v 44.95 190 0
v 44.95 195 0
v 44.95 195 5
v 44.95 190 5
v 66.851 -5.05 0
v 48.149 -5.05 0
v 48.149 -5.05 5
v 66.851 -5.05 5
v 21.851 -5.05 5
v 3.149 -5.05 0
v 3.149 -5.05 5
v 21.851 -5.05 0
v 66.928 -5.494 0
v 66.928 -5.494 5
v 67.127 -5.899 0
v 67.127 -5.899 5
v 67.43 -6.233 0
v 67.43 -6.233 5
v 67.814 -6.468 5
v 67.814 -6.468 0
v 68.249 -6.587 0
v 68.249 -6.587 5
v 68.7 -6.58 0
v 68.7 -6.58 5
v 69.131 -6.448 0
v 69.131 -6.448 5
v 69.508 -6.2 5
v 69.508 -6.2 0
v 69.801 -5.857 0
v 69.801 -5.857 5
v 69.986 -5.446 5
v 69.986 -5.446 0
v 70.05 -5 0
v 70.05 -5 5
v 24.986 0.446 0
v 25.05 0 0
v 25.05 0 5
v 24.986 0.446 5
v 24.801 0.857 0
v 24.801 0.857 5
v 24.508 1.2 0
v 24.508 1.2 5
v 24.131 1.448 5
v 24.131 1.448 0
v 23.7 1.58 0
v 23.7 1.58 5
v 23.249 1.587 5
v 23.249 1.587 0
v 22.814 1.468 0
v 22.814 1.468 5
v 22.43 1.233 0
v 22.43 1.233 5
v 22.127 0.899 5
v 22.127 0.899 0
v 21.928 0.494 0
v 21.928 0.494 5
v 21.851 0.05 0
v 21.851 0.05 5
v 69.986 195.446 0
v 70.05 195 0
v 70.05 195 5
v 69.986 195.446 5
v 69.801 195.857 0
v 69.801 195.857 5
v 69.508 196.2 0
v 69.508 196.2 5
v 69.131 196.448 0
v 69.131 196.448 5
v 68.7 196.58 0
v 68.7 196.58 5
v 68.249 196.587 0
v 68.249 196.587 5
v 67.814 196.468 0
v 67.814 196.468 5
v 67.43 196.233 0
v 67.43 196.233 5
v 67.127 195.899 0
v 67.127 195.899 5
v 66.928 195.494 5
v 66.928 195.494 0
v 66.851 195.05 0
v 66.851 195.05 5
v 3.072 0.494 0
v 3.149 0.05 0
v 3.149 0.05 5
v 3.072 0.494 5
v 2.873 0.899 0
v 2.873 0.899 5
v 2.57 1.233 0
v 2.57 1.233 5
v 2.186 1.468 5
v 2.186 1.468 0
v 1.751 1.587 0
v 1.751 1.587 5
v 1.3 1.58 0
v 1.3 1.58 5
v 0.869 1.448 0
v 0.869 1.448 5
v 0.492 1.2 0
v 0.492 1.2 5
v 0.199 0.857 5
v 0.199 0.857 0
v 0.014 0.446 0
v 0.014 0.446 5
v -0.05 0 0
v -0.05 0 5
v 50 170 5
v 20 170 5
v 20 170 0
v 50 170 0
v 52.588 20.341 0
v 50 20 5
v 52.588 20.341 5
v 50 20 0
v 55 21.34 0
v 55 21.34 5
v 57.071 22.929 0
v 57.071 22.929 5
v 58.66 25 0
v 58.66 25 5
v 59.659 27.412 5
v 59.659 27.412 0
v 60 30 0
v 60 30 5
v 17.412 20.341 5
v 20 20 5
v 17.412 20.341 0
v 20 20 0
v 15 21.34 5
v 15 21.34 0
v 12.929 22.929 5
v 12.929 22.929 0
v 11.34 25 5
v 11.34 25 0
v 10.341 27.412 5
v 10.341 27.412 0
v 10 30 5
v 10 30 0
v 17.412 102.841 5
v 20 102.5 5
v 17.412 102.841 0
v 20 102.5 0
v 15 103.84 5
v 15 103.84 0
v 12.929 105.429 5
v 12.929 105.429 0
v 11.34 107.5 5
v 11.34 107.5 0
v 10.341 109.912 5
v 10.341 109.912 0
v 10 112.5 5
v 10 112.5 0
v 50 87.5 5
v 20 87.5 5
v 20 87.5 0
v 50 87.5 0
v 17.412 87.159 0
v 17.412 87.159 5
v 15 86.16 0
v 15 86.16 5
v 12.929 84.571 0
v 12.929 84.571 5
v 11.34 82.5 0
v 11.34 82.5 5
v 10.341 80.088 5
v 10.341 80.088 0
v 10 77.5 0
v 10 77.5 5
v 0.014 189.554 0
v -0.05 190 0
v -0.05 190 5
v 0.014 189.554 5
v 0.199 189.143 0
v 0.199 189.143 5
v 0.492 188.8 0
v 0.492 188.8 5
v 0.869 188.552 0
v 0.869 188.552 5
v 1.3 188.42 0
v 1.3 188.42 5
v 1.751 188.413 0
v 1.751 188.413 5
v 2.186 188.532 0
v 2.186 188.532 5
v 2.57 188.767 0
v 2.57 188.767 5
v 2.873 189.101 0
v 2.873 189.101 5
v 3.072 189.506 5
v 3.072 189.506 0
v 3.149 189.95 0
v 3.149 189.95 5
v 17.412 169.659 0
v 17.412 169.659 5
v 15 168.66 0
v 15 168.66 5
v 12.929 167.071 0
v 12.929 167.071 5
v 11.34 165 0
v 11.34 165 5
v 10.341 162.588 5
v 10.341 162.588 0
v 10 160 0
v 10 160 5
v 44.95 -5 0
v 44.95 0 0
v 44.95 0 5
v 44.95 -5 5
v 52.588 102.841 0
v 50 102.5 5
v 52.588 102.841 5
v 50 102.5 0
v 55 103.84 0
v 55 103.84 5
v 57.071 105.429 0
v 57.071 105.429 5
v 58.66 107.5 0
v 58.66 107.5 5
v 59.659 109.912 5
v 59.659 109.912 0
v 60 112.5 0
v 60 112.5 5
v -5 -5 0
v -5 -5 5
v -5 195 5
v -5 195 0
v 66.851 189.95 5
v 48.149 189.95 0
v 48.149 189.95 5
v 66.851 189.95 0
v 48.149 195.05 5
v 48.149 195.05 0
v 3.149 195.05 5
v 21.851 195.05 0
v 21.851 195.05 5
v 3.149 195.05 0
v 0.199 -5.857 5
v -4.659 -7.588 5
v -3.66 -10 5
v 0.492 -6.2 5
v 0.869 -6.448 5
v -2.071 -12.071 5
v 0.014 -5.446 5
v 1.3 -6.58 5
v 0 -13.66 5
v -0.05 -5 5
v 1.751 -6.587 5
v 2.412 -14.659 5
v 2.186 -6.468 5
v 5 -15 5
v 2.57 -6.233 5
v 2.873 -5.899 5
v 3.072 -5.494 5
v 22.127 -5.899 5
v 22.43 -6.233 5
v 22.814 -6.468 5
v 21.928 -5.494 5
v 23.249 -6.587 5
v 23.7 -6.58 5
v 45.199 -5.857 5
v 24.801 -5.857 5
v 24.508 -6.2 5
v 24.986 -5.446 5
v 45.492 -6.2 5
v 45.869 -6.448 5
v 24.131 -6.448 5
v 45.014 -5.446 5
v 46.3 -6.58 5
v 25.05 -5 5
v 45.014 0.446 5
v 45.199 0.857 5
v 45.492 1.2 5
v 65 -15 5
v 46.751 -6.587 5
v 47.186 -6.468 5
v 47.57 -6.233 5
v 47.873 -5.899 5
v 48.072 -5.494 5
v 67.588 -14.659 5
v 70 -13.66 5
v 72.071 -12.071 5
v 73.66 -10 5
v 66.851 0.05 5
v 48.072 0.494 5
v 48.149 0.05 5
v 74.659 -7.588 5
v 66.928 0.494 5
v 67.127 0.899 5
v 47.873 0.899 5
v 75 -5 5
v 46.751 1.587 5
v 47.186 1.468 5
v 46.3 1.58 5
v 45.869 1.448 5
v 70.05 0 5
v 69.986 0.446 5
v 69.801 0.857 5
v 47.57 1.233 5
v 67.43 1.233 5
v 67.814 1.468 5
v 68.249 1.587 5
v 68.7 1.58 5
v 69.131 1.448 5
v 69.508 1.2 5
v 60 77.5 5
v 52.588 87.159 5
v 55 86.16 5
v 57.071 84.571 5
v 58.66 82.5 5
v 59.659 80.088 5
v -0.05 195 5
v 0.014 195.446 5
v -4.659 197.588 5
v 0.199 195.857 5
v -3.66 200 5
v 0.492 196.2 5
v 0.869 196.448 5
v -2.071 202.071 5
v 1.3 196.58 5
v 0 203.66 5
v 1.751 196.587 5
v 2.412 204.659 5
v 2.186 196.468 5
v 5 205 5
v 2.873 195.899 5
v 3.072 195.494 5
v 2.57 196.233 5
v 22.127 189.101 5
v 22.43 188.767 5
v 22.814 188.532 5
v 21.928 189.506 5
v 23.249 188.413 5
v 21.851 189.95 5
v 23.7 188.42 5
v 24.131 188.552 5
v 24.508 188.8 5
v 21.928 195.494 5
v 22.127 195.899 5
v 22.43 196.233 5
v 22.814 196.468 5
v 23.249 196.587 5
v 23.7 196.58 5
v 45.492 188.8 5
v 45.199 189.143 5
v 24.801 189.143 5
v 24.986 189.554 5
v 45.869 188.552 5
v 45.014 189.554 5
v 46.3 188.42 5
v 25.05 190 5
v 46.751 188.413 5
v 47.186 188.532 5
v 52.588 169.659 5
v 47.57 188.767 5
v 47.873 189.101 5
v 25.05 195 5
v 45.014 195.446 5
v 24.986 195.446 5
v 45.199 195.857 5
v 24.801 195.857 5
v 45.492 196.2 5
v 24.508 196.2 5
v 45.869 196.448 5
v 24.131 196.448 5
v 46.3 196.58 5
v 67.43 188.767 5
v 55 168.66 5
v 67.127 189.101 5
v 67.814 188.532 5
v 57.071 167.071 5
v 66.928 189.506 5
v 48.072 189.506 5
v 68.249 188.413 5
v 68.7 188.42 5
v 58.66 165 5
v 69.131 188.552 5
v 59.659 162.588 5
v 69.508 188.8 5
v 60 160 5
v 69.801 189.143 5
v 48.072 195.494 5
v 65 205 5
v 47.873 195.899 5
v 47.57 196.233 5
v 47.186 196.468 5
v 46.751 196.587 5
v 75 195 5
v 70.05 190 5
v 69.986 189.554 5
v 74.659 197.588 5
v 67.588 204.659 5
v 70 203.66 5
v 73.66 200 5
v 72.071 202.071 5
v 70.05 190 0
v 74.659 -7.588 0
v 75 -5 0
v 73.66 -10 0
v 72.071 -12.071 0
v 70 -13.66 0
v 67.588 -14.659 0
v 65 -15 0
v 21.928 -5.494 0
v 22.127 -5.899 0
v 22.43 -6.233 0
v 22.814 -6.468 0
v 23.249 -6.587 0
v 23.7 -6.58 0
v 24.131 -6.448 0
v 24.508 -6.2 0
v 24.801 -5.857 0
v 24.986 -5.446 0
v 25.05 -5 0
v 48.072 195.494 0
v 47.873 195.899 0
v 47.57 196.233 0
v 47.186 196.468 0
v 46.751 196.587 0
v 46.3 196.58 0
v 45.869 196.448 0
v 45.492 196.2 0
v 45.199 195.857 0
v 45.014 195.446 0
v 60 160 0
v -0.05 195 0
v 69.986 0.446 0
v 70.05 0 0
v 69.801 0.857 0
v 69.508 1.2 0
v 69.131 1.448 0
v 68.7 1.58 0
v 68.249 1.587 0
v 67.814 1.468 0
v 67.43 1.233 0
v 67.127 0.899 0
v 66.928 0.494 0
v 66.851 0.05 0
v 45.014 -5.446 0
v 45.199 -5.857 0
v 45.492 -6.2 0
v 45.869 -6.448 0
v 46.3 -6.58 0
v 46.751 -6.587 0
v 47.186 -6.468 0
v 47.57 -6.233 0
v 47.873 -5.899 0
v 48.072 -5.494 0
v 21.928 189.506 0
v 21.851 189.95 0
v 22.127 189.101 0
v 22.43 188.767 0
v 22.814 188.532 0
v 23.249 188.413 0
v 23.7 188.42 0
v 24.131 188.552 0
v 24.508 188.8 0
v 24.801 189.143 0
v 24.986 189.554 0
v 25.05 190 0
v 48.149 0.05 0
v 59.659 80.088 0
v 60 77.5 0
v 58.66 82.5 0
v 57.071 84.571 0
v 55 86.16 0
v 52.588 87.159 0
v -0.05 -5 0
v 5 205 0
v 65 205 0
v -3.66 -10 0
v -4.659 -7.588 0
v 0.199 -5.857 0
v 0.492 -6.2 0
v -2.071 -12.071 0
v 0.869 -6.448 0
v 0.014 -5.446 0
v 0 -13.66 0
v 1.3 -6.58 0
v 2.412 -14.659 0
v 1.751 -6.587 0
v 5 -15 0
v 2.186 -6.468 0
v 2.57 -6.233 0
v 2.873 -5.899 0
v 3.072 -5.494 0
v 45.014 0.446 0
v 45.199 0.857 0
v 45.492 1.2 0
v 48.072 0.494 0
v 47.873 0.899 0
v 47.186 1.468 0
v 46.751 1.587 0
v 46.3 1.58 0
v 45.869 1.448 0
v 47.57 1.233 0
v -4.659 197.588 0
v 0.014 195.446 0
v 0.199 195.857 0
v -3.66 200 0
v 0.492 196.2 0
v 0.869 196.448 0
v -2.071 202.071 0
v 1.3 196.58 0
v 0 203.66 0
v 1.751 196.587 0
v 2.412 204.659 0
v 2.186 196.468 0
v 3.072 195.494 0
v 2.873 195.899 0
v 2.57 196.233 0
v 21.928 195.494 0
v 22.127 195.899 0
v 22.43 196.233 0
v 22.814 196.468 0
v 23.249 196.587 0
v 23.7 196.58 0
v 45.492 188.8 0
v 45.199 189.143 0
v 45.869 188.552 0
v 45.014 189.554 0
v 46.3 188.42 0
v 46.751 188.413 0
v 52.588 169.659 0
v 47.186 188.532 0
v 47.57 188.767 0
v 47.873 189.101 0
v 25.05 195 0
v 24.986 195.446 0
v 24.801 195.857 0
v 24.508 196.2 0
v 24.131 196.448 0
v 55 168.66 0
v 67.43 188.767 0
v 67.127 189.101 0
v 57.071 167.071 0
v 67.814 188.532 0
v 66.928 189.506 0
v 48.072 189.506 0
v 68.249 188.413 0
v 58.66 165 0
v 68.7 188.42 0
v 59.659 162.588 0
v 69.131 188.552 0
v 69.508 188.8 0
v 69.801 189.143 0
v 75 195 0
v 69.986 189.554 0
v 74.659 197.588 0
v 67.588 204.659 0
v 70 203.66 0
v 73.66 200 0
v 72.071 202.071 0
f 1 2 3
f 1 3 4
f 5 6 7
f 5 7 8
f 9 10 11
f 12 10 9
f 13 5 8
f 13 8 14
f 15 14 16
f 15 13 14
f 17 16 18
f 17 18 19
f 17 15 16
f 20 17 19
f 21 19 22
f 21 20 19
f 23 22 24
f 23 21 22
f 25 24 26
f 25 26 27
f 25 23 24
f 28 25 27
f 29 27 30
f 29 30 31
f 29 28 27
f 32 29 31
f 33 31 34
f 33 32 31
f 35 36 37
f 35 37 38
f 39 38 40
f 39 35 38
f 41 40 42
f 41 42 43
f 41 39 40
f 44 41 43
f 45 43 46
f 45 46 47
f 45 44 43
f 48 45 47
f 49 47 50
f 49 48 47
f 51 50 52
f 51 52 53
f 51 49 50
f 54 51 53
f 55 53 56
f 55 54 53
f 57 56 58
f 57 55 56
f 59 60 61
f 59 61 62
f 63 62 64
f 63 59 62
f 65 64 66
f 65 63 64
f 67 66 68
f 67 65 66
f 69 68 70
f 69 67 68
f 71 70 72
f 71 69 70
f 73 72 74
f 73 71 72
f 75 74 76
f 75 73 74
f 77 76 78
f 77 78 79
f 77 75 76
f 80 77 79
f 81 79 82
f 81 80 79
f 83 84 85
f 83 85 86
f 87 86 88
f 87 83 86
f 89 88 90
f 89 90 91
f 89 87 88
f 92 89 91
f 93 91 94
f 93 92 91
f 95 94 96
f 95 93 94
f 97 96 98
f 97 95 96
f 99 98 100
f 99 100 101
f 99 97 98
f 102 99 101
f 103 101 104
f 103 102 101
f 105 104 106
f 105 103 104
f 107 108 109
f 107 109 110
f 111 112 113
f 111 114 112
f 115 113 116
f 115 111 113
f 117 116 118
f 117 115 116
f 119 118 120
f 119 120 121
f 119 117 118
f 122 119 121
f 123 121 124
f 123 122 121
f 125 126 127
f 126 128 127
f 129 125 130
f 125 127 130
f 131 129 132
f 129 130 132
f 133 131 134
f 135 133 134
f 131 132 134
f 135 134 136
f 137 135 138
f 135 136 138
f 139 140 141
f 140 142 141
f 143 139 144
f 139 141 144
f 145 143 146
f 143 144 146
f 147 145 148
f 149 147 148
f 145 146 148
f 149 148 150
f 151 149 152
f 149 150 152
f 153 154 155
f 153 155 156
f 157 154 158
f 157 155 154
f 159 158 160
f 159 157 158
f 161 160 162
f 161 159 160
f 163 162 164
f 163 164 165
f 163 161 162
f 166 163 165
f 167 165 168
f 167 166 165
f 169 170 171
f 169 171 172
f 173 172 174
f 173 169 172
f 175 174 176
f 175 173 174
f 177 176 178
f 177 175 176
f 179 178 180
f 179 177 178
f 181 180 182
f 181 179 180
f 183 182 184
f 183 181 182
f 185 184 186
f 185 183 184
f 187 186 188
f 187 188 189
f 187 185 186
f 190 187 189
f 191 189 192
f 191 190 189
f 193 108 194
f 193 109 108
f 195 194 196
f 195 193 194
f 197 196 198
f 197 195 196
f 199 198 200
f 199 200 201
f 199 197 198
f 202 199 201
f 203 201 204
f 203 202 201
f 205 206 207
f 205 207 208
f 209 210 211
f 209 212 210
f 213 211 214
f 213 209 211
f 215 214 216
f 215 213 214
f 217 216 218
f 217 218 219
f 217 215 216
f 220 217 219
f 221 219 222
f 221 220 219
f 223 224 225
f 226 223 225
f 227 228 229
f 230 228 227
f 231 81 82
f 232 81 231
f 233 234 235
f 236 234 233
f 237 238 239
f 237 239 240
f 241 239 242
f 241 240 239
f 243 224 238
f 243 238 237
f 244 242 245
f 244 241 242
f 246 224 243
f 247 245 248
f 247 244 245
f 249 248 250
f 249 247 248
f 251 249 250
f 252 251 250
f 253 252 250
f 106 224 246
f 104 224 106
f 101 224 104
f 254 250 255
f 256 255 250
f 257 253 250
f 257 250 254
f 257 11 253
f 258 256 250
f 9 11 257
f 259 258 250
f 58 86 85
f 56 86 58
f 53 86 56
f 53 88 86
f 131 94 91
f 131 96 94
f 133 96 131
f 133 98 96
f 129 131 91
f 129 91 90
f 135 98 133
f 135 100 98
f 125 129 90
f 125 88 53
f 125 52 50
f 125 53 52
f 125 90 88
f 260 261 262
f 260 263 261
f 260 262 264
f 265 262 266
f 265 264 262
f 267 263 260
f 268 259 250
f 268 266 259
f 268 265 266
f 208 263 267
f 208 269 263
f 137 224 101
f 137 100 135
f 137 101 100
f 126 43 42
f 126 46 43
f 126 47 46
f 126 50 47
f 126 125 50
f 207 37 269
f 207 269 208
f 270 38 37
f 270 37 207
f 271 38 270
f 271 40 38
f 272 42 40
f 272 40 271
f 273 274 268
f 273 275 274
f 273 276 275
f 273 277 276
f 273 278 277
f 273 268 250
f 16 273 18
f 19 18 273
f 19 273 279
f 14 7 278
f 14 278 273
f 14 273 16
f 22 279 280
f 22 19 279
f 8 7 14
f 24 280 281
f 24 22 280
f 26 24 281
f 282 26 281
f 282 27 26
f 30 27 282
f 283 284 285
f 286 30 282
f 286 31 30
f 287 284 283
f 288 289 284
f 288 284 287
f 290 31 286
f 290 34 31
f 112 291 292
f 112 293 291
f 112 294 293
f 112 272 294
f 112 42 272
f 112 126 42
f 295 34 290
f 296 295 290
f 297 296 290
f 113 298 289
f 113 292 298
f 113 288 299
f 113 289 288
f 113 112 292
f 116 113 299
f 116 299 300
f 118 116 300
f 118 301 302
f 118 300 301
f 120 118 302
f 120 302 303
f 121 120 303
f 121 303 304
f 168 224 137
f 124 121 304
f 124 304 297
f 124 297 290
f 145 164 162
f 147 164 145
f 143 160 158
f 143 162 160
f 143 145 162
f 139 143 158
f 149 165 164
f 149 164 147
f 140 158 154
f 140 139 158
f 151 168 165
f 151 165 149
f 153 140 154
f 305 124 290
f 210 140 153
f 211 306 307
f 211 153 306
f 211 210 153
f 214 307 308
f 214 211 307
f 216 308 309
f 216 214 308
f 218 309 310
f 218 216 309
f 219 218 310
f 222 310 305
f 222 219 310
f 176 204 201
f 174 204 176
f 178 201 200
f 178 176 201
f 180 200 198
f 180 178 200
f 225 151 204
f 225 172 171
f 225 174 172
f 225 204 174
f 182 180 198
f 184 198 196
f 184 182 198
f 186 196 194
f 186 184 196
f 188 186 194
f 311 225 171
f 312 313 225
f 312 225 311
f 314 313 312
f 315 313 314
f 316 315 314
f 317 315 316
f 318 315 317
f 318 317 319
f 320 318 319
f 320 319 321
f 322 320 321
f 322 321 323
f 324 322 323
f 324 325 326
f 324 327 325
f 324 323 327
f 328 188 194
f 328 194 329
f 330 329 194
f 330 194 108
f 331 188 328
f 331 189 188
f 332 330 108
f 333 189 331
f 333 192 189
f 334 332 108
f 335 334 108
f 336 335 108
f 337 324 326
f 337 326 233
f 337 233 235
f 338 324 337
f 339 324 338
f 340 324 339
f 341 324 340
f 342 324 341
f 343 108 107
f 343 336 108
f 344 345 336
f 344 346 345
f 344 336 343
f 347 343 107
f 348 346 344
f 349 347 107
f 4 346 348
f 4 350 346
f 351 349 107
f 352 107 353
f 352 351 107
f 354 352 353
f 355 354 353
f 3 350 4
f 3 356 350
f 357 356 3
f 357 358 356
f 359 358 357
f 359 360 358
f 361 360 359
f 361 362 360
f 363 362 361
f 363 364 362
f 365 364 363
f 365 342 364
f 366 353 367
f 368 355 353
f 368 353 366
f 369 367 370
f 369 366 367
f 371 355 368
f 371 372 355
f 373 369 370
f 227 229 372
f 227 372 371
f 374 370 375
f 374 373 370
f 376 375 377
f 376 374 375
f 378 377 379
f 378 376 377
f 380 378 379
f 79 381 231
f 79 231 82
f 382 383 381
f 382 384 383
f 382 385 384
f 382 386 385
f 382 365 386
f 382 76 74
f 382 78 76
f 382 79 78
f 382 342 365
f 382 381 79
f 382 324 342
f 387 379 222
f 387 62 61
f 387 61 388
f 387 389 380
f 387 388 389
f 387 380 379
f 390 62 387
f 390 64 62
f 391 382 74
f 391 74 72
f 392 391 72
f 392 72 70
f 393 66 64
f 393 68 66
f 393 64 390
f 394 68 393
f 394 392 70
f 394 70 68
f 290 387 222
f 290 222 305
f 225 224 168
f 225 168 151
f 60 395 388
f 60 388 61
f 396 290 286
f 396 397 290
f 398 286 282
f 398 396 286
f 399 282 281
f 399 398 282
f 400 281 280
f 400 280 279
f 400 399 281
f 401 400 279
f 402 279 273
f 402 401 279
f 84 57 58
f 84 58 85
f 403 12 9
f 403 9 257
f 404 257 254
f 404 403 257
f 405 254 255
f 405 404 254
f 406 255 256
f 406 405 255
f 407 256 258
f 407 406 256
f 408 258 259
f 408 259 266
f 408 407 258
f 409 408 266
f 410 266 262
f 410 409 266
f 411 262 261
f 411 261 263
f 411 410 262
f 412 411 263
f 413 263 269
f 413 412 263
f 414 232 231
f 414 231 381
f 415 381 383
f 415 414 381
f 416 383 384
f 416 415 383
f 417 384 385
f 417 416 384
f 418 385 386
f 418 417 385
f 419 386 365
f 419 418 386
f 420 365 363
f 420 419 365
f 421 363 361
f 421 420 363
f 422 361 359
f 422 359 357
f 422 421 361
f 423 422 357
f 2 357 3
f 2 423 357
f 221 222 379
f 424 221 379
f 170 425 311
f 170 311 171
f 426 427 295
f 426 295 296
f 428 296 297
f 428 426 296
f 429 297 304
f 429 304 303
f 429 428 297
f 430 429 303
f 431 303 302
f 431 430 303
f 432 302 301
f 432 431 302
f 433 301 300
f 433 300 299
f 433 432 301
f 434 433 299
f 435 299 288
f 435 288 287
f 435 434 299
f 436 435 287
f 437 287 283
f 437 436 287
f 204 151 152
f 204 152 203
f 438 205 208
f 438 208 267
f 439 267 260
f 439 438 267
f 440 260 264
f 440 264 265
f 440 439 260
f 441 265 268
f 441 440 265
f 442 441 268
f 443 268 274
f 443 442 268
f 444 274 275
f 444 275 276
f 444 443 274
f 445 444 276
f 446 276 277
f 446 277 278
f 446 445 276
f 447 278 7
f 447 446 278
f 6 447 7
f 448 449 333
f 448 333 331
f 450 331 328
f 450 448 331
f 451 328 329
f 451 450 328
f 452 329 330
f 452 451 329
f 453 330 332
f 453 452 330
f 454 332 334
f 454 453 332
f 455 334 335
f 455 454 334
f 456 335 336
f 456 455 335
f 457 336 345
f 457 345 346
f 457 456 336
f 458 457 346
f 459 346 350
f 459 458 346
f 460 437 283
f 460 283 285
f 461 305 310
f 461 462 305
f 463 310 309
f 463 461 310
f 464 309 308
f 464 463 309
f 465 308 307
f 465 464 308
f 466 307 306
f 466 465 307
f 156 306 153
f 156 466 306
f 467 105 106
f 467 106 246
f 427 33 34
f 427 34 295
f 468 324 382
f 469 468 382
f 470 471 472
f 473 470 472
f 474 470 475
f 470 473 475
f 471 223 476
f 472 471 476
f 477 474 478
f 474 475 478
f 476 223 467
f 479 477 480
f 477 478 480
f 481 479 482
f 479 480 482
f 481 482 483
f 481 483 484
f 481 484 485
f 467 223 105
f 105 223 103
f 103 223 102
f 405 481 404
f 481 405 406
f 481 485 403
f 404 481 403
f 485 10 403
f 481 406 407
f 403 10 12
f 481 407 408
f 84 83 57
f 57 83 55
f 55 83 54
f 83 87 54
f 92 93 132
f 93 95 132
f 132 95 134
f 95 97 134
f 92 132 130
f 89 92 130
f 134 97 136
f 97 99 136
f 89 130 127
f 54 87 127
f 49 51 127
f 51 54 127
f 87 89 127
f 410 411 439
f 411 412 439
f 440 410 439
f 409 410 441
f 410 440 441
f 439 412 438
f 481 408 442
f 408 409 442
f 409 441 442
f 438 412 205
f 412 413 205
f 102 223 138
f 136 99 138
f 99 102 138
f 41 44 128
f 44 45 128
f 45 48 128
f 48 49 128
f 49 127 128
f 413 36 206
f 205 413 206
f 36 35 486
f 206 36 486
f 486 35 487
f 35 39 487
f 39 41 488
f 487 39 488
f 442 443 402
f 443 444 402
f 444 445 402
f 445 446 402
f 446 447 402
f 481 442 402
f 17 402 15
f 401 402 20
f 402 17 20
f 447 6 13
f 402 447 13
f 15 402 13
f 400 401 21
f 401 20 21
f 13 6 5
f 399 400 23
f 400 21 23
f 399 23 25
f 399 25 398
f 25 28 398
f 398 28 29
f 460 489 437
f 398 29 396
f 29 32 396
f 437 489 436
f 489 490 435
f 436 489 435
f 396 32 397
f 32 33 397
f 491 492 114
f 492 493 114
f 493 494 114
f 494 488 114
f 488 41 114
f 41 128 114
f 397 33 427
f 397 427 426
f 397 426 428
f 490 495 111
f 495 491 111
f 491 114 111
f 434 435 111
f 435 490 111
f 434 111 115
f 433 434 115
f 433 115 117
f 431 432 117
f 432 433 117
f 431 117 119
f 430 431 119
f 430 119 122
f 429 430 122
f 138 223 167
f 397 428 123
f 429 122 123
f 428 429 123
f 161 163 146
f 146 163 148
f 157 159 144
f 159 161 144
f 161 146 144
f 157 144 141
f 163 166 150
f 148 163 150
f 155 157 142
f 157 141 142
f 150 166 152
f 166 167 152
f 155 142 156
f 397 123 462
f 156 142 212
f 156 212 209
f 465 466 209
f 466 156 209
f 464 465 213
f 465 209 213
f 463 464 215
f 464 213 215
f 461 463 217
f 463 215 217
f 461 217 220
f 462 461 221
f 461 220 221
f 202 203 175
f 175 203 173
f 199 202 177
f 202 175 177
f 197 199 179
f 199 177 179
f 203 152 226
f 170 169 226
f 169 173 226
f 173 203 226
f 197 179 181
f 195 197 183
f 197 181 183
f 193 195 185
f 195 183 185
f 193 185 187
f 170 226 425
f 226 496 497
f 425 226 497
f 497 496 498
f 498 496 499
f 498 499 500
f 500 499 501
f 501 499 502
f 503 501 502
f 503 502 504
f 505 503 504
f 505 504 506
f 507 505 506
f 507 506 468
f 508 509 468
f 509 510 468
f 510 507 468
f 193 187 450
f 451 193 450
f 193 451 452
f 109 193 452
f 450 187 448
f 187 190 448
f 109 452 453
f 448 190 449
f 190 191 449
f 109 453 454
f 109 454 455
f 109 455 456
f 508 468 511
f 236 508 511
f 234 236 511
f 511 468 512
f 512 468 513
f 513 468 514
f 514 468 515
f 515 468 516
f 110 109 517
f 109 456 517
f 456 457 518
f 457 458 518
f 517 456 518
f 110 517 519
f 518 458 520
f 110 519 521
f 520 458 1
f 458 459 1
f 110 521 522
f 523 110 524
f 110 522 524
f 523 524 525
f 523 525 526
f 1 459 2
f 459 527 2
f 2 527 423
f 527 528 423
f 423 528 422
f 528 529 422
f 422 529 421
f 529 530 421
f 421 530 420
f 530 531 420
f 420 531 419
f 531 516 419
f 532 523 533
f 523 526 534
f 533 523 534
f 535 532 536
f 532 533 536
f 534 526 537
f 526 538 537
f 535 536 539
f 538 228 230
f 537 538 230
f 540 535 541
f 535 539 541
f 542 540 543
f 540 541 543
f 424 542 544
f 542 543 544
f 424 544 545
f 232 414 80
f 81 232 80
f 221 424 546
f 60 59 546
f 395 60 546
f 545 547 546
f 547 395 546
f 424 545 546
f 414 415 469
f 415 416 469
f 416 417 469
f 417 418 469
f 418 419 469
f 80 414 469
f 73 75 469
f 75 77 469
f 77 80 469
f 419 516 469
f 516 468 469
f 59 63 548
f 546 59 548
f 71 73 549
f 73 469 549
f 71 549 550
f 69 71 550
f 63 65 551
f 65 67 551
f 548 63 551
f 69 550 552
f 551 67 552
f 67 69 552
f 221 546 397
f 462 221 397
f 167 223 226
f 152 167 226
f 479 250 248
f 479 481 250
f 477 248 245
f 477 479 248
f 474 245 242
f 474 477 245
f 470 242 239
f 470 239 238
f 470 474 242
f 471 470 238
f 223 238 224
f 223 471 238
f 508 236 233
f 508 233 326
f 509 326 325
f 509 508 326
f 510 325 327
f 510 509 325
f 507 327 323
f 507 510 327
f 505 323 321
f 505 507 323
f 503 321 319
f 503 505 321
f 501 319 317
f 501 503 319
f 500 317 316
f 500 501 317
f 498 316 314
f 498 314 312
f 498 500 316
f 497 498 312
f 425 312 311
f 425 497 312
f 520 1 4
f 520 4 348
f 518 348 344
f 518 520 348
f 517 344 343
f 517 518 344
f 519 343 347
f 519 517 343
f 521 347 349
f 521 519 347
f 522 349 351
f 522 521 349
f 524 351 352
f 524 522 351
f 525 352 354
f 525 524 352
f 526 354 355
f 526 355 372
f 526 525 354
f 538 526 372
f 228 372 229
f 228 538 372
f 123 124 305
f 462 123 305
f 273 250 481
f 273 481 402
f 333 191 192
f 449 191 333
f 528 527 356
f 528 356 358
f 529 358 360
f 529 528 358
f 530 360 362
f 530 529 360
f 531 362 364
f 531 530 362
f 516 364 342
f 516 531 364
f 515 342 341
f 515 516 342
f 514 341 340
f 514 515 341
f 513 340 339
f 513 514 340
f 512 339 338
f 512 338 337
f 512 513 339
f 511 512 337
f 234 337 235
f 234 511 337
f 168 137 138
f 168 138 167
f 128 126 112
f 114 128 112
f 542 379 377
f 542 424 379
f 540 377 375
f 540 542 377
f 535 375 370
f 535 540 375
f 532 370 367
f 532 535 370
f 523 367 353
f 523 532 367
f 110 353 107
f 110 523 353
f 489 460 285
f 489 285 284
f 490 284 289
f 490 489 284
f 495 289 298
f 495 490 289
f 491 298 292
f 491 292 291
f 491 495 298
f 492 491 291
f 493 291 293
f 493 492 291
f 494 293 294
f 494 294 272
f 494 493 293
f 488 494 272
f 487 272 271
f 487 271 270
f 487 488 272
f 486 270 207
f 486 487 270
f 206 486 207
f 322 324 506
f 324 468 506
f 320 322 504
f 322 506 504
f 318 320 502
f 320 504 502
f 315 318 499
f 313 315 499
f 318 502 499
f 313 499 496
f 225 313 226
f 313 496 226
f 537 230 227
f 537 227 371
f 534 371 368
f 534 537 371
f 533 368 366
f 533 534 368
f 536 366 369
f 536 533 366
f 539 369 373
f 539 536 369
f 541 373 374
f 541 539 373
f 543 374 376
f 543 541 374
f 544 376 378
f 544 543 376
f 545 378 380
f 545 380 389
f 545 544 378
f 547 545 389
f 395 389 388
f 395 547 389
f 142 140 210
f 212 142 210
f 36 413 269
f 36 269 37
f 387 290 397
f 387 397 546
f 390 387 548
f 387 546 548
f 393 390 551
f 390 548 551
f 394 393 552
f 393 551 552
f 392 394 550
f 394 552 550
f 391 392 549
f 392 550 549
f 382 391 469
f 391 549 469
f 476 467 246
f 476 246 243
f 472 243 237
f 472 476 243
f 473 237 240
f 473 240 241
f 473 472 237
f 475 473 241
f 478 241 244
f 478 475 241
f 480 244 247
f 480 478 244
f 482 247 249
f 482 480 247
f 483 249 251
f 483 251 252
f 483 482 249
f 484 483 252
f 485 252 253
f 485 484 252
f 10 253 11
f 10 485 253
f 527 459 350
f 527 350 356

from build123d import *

# Parameters (mm, degrees)
SKETCH_1_W          = 25
SKETCH_1_H          = 5
SKETCH_1_W_2        = 70
SKETCH_1_H_2        = 190
EXTRUDE_1_DEPTH     = 5
SKETCH_3_W          = 50
SKETCH_3_H          = 67.5
CUT_EXTRUDE_2_DEPTH = 5
FILLET_1_R          = 10
CUT_EXTRUDE_3_DEPTH = 10
SKETCH_6_W          = 5
SKETCH_6_H          = 220
EXTRUDE_2_DEPTH     = 5
MOVE_FACE_1_DEPTH   = 5
FILLET_2_R          = 10


# Read off the part's stored shape, not the designer's step: 移动面1
with BuildPart() as part:
    # 草图1 → 凸台-拉伸1 (new body)
    with BuildSketch(Plane.XY):
        with Locations((57.5, 192.5)):
            Rectangle(SKETCH_1_W, SKETCH_1_H)
        with Locations((35, 95)):
            Rectangle(SKETCH_1_W_2, SKETCH_1_H_2)
        with Locations((12.5, 192.5)):
            Rectangle(SKETCH_1_W, SKETCH_1_H)
        with Locations((57.5, -2.5)):
            Rectangle(SKETCH_1_W, SKETCH_1_H)
        with Locations((12.5, -2.5)):
            Rectangle(SKETCH_1_W, SKETCH_1_H)
        Polygon((25, -5), (0, -5), (0, -15), (70, -15), (70, -5), (45, -5), (45, 0), (25, 0), align=None)
        Polygon((25, 195), (25, 190), (45, 190), (45, 195), (70, 195), (70, 205), (0, 205), (0, 195), align=None)
    extrude(amount=EXTRUDE_1_DEPTH)

    # 草图3 → 切除-拉伸2 (cut)
    with BuildSketch(Plane.XY.offset(5)):
        with Locations((35, 53.75)):
            Rectangle(SKETCH_3_W, SKETCH_3_H)
        with Locations((35, 136.25)):
            Rectangle(SKETCH_3_W, SKETCH_3_H)
    extrude(amount=-CUT_EXTRUDE_2_DEPTH, mode=Mode.SUBTRACT)

    # 圆角1
    fillet_1_edges = [part.edges().sort_by_distance(p)[0] for p in [
        (10, 20, 2.5),
        (10, 87.5, 2.5),
        (60, 87.5, 2.5),
        (60, 20, 2.5),
        (10, 102.5, 2.5),
        (10, 170, 2.5),
        (60, 170, 2.5),
        (60, 102.5, 2.5),
    ]]
    fillet(fillet_1_edges, radius=FILLET_1_R)

    # 草图5 → 切除-拉伸3 (cut)
    with BuildSketch(Plane.XY.offset(5)):
        with BuildLine():
            Line((3.1, 0), (21.9, 0))
            ThreePointArc((21.9, 0), (23.45, 1.55), (25, 0))
            Line((25, 0), (25, -5))
            ThreePointArc((25, -5), (23.45, -6.55), (21.9, -5))
            Line((21.9, -5), (3.1, -5))
            ThreePointArc((3.1, -5), (1.55, -6.55), (0, -5))
            Line((0, -5), (0, 0))
            ThreePointArc((0, 0), (1.55, 1.55), (3.1, 0))
        make_face()
        with BuildLine():
            Line((45, 0), (45, -5))
            ThreePointArc((45, -5), (46.55, -6.55), (48.1, -5))
            Line((48.1, -5), (66.9, -5))
            ThreePointArc((66.9, -5), (68.45, -6.55), (70, -5))
            Line((70, -5), (70, 0))
            ThreePointArc((70, 0), (68.45, 1.55), (66.9, 0))
            Line((66.9, 0), (48.1, 0))
            ThreePointArc((48.1, 0), (46.55, 1.55), (45, 0))
        make_face()
        with BuildLine():
            Line((66.9, 190), (48.1, 190))
            ThreePointArc((48.1, 190), (46.55, 188.45), (45, 190))
            Line((45, 190), (45, 195))
            ThreePointArc((45, 195), (46.55, 196.55), (48.1, 195))
            Line((48.1, 195), (66.9, 195))
            ThreePointArc((66.9, 195), (68.45, 196.55), (70, 195))
            Line((70, 195), (70, 190))
            ThreePointArc((70, 190), (68.45, 188.45), (66.9, 190))
        make_face()
        with BuildLine():
            Line((25, 190), (25, 195))
            ThreePointArc((25, 195), (23.45, 196.55), (21.9, 195))
            Line((21.9, 195), (3.1, 195))
            ThreePointArc((3.1, 195), (1.55, 196.55), (0, 195))
            Line((0, 195), (0, 190))
            ThreePointArc((0, 190), (1.55, 188.45), (3.1, 190))
            Line((3.1, 190), (21.9, 190))
            ThreePointArc((21.9, 190), (23.45, 188.45), (25, 190))
        make_face()
    extrude(amount=-CUT_EXTRUDE_3_DEPTH, mode=Mode.SUBTRACT)

    # 草图6 → 凸台-拉伸2 (add)
    with BuildSketch(Plane.XY.offset(5)):
        with Locations((72.5, 95)):
            Rectangle(SKETCH_6_W, SKETCH_6_H)
        with Locations((-2.5, 95)):
            Rectangle(SKETCH_6_W, SKETCH_6_H)
    extrude(amount=-EXTRUDE_2_DEPTH)

    # Move Face 1 outline → Move Face 1 (cut)
    # profile 1 of 4: a face of its own
    with BuildSketch(Plane.XY):
        with BuildLine():
            Line((21.850781441, 0.05), (3.149218559, 0.05))
            ThreePointArc((3.149218559, 0.05), (1.524996947, 1.599804628), (-0.05, 0))
            Line((-0.05, 0), (-0.05, -5))
            ThreePointArc((-0.05, -5), (1.524996947, -6.599804628), (3.149218559, -5.05))
            Line((3.149218559, -5.05), (21.850781441, -5.05))
            ThreePointArc((21.850781441, -5.05), (23.475003053, -6.599804628), (25.05, -5))
            Line((25.05, -5), (25.05, 0))
            ThreePointArc((25.05, 0), (23.475003053, 1.599804628), (21.850781441, 0.05))
        make_face()
        with BuildLine():
            ThreePointArc((0, 0), (1.55, 1.55), (3.1, 0))
            Line((3.1, 0), (21.9, 0))
            ThreePointArc((21.9, 0), (23.45, 1.55), (25, 0))
            Line((25, 0), (25, -5))
            ThreePointArc((25, -5), (23.45, -6.55), (21.9, -5))
            Line((21.9, -5), (3.1, -5))
            ThreePointArc((3.1, -5), (1.55, -6.55), (0, -5))
            Line((0, -5), (0, 0))
        make_face(mode=Mode.SUBTRACT)
    # profile 2 of 4: a face of its own
    with BuildSketch(Plane.XY):
        with BuildLine():
            ThreePointArc((70.05, 0), (68.475003053, 1.599804628), (66.850781441, 0.05))
            Line((66.850781441, 0.05), (48.149218559, 0.05))
            ThreePointArc((48.149218559, 0.05), (46.524996947, 1.599804628), (44.95, 0))
            Line((44.95, 0), (44.95, -5))
            ThreePointArc((44.95, -5), (46.524996947, -6.599804628), (48.149218559, -5.05))
            Line((48.149218559, -5.05), (66.850781441, -5.05))
            ThreePointArc((66.850781441, -5.05), (68.475003053, -6.599804628), (70.05, -5))
            Line((70.05, -5), (70.05, 0))
        make_face()
        with BuildLine():
            Line((48.1, 0), (66.9, 0))
            ThreePointArc((66.9, 0), (68.45, 1.55), (70, 0))
            Line((70, 0), (70, -5))
            ThreePointArc((70, -5), (68.45, -6.55), (66.9, -5))
            Line((66.9, -5), (48.1, -5))
            ThreePointArc((48.1, -5), (46.55, -6.55), (45, -5))
            Line((45, -5), (45, 0))
            ThreePointArc((45, 0), (46.55, 1.55), (48.1, 0))
        make_face(mode=Mode.SUBTRACT)
    # profile 3 of 4: a face of its own
    with BuildSketch(Plane.XY):
        with BuildLine():
            ThreePointArc((21.850781441, 189.95), (23.475003053, 188.400195372), (25.05, 190))
            Line((25.05, 190), (25.05, 195))
            ThreePointArc((25.05, 195), (23.475003053, 196.599804628), (21.850781441, 195.05))
            Line((21.850781441, 195.05), (3.149218559, 195.05))
            ThreePointArc((3.149218559, 195.05), (1.524996947, 196.599804628), (-0.05, 195))
            Line((-0.05, 195), (-0.05, 190))
            ThreePointArc((-0.05, 190), (1.524996947, 188.400195372), (3.149218559, 189.95))
            Line((3.149218559, 189.95), (21.850781441, 189.95))
        make_face()
        with BuildLine():
            Line((25, 195), (25, 190))
            ThreePointArc((25, 190), (23.45, 188.45), (21.9, 190))
            Line((21.9, 190), (3.1, 190))
            ThreePointArc((3.1, 190), (1.55, 188.45), (0, 190))
            Line((0, 190), (0, 195))
            ThreePointArc((0, 195), (1.55, 196.55), (3.1, 195))
            Line((3.1, 195), (21.9, 195))
            ThreePointArc((21.9, 195), (23.45, 196.55), (25, 195))
        make_face(mode=Mode.SUBTRACT)
    # profile 4 of 4: a face of its own
    with BuildSketch(Plane.XY):
        with BuildLine():
            ThreePointArc((48.149218559, 195.05), (46.524996947, 196.599804628), (44.95, 195))
            Line((44.95, 195), (44.95, 190))
            ThreePointArc((44.95, 190), (46.524996947, 188.400195372), (48.149218559, 189.95))
            Line((48.149218559, 189.95), (66.850781441, 189.95))
            ThreePointArc((66.850781441, 189.95), (68.475003053, 188.400195372), (70.05, 190))
            Line((70.05, 190), (70.05, 195))
            ThreePointArc((70.05, 195), (68.475003053, 196.599804628), (66.850781441, 195.05))
            Line((66.850781441, 195.05), (48.149218559, 195.05))
        make_face()
        with BuildLine():
            Line((45, 190), (45, 195))
            ThreePointArc((45, 195), (46.55, 196.55), (48.1, 195))
            Line((48.1, 195), (66.9, 195))
            ThreePointArc((66.9, 195), (68.45, 196.55), (70, 195))
            Line((70, 195), (70, 190))
            ThreePointArc((70, 190), (68.45, 188.45), (66.9, 190))
            Line((66.9, 190), (48.1, 190))
            ThreePointArc((48.1, 190), (46.55, 188.45), (45, 190))
        make_face(mode=Mode.SUBTRACT)
    extrude(amount=MOVE_FACE_1_DEPTH, mode=Mode.SUBTRACT)

    # 圆角2
    fillet_2_edges = [part.edges().sort_by_distance(p)[0] for p in [
        (75, 205, 2.5),
        (75, -15, 2.5),
        (-5, -15, 2.5),
        (-5, 205, 2.5),
    ]]
    fillet(fillet_2_edges, radius=FILLET_2_R)


solid = part.part
